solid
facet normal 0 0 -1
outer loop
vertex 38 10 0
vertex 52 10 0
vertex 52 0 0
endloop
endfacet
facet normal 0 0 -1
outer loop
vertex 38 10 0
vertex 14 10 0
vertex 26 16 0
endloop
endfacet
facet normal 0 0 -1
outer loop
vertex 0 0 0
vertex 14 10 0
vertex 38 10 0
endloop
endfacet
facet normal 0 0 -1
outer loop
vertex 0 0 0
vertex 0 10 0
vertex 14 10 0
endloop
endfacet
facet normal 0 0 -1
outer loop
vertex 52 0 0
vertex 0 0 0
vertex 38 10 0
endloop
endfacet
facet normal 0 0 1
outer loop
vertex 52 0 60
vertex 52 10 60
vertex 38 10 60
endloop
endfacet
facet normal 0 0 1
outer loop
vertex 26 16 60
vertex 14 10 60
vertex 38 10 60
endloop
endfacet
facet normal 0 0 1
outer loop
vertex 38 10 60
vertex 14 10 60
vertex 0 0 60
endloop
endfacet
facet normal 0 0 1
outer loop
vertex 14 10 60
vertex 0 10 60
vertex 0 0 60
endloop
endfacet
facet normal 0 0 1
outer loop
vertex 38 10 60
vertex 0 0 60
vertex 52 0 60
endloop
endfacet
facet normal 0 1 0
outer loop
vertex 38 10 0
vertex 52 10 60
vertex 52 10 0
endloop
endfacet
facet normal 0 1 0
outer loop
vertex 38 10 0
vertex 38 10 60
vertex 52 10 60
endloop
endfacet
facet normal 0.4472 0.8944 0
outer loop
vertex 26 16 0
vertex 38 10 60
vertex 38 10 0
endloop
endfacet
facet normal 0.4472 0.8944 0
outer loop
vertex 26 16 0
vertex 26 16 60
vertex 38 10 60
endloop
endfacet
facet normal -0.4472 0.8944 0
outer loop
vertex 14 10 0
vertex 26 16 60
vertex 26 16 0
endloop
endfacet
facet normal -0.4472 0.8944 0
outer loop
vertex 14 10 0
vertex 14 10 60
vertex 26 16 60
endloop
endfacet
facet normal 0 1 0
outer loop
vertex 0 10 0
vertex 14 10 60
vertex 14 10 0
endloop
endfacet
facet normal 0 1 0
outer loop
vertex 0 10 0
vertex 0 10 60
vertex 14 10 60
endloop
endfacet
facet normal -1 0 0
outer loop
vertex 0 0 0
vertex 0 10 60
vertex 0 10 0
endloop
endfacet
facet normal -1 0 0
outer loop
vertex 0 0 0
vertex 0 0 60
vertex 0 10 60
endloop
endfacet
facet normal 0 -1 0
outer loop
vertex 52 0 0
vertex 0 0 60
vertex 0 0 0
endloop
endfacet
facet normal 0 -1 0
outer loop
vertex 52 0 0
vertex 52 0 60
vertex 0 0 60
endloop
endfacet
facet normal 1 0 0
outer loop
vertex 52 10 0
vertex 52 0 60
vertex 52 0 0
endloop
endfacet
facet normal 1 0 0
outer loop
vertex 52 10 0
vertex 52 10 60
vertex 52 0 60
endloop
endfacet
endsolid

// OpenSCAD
$fn = 32;

// ----------------------------------------------------------------------
// V guide rail: vrib, 52 mm wide
// ----------------------------------------------------------------------

// --- parameters (mm) ---
rail_w = 52;              // rail width, X
base_t = 10;              // base plate thickness
v_depth = 6;              // V feature depth / height
v_half_w = 12;            // half width of the V at the base face
plate_t = 60;             // rail length, Z (the extrusion height)

profile = [[0, 0], [52, 0], [52, 10], [38, 10], [26, 16], [14, 10], [0, 10]];  // primary outline, 7 points, counter clockwise

// --- the one profile operation ---
linear_extrude(height = plate_t) polygon(points = profile);
